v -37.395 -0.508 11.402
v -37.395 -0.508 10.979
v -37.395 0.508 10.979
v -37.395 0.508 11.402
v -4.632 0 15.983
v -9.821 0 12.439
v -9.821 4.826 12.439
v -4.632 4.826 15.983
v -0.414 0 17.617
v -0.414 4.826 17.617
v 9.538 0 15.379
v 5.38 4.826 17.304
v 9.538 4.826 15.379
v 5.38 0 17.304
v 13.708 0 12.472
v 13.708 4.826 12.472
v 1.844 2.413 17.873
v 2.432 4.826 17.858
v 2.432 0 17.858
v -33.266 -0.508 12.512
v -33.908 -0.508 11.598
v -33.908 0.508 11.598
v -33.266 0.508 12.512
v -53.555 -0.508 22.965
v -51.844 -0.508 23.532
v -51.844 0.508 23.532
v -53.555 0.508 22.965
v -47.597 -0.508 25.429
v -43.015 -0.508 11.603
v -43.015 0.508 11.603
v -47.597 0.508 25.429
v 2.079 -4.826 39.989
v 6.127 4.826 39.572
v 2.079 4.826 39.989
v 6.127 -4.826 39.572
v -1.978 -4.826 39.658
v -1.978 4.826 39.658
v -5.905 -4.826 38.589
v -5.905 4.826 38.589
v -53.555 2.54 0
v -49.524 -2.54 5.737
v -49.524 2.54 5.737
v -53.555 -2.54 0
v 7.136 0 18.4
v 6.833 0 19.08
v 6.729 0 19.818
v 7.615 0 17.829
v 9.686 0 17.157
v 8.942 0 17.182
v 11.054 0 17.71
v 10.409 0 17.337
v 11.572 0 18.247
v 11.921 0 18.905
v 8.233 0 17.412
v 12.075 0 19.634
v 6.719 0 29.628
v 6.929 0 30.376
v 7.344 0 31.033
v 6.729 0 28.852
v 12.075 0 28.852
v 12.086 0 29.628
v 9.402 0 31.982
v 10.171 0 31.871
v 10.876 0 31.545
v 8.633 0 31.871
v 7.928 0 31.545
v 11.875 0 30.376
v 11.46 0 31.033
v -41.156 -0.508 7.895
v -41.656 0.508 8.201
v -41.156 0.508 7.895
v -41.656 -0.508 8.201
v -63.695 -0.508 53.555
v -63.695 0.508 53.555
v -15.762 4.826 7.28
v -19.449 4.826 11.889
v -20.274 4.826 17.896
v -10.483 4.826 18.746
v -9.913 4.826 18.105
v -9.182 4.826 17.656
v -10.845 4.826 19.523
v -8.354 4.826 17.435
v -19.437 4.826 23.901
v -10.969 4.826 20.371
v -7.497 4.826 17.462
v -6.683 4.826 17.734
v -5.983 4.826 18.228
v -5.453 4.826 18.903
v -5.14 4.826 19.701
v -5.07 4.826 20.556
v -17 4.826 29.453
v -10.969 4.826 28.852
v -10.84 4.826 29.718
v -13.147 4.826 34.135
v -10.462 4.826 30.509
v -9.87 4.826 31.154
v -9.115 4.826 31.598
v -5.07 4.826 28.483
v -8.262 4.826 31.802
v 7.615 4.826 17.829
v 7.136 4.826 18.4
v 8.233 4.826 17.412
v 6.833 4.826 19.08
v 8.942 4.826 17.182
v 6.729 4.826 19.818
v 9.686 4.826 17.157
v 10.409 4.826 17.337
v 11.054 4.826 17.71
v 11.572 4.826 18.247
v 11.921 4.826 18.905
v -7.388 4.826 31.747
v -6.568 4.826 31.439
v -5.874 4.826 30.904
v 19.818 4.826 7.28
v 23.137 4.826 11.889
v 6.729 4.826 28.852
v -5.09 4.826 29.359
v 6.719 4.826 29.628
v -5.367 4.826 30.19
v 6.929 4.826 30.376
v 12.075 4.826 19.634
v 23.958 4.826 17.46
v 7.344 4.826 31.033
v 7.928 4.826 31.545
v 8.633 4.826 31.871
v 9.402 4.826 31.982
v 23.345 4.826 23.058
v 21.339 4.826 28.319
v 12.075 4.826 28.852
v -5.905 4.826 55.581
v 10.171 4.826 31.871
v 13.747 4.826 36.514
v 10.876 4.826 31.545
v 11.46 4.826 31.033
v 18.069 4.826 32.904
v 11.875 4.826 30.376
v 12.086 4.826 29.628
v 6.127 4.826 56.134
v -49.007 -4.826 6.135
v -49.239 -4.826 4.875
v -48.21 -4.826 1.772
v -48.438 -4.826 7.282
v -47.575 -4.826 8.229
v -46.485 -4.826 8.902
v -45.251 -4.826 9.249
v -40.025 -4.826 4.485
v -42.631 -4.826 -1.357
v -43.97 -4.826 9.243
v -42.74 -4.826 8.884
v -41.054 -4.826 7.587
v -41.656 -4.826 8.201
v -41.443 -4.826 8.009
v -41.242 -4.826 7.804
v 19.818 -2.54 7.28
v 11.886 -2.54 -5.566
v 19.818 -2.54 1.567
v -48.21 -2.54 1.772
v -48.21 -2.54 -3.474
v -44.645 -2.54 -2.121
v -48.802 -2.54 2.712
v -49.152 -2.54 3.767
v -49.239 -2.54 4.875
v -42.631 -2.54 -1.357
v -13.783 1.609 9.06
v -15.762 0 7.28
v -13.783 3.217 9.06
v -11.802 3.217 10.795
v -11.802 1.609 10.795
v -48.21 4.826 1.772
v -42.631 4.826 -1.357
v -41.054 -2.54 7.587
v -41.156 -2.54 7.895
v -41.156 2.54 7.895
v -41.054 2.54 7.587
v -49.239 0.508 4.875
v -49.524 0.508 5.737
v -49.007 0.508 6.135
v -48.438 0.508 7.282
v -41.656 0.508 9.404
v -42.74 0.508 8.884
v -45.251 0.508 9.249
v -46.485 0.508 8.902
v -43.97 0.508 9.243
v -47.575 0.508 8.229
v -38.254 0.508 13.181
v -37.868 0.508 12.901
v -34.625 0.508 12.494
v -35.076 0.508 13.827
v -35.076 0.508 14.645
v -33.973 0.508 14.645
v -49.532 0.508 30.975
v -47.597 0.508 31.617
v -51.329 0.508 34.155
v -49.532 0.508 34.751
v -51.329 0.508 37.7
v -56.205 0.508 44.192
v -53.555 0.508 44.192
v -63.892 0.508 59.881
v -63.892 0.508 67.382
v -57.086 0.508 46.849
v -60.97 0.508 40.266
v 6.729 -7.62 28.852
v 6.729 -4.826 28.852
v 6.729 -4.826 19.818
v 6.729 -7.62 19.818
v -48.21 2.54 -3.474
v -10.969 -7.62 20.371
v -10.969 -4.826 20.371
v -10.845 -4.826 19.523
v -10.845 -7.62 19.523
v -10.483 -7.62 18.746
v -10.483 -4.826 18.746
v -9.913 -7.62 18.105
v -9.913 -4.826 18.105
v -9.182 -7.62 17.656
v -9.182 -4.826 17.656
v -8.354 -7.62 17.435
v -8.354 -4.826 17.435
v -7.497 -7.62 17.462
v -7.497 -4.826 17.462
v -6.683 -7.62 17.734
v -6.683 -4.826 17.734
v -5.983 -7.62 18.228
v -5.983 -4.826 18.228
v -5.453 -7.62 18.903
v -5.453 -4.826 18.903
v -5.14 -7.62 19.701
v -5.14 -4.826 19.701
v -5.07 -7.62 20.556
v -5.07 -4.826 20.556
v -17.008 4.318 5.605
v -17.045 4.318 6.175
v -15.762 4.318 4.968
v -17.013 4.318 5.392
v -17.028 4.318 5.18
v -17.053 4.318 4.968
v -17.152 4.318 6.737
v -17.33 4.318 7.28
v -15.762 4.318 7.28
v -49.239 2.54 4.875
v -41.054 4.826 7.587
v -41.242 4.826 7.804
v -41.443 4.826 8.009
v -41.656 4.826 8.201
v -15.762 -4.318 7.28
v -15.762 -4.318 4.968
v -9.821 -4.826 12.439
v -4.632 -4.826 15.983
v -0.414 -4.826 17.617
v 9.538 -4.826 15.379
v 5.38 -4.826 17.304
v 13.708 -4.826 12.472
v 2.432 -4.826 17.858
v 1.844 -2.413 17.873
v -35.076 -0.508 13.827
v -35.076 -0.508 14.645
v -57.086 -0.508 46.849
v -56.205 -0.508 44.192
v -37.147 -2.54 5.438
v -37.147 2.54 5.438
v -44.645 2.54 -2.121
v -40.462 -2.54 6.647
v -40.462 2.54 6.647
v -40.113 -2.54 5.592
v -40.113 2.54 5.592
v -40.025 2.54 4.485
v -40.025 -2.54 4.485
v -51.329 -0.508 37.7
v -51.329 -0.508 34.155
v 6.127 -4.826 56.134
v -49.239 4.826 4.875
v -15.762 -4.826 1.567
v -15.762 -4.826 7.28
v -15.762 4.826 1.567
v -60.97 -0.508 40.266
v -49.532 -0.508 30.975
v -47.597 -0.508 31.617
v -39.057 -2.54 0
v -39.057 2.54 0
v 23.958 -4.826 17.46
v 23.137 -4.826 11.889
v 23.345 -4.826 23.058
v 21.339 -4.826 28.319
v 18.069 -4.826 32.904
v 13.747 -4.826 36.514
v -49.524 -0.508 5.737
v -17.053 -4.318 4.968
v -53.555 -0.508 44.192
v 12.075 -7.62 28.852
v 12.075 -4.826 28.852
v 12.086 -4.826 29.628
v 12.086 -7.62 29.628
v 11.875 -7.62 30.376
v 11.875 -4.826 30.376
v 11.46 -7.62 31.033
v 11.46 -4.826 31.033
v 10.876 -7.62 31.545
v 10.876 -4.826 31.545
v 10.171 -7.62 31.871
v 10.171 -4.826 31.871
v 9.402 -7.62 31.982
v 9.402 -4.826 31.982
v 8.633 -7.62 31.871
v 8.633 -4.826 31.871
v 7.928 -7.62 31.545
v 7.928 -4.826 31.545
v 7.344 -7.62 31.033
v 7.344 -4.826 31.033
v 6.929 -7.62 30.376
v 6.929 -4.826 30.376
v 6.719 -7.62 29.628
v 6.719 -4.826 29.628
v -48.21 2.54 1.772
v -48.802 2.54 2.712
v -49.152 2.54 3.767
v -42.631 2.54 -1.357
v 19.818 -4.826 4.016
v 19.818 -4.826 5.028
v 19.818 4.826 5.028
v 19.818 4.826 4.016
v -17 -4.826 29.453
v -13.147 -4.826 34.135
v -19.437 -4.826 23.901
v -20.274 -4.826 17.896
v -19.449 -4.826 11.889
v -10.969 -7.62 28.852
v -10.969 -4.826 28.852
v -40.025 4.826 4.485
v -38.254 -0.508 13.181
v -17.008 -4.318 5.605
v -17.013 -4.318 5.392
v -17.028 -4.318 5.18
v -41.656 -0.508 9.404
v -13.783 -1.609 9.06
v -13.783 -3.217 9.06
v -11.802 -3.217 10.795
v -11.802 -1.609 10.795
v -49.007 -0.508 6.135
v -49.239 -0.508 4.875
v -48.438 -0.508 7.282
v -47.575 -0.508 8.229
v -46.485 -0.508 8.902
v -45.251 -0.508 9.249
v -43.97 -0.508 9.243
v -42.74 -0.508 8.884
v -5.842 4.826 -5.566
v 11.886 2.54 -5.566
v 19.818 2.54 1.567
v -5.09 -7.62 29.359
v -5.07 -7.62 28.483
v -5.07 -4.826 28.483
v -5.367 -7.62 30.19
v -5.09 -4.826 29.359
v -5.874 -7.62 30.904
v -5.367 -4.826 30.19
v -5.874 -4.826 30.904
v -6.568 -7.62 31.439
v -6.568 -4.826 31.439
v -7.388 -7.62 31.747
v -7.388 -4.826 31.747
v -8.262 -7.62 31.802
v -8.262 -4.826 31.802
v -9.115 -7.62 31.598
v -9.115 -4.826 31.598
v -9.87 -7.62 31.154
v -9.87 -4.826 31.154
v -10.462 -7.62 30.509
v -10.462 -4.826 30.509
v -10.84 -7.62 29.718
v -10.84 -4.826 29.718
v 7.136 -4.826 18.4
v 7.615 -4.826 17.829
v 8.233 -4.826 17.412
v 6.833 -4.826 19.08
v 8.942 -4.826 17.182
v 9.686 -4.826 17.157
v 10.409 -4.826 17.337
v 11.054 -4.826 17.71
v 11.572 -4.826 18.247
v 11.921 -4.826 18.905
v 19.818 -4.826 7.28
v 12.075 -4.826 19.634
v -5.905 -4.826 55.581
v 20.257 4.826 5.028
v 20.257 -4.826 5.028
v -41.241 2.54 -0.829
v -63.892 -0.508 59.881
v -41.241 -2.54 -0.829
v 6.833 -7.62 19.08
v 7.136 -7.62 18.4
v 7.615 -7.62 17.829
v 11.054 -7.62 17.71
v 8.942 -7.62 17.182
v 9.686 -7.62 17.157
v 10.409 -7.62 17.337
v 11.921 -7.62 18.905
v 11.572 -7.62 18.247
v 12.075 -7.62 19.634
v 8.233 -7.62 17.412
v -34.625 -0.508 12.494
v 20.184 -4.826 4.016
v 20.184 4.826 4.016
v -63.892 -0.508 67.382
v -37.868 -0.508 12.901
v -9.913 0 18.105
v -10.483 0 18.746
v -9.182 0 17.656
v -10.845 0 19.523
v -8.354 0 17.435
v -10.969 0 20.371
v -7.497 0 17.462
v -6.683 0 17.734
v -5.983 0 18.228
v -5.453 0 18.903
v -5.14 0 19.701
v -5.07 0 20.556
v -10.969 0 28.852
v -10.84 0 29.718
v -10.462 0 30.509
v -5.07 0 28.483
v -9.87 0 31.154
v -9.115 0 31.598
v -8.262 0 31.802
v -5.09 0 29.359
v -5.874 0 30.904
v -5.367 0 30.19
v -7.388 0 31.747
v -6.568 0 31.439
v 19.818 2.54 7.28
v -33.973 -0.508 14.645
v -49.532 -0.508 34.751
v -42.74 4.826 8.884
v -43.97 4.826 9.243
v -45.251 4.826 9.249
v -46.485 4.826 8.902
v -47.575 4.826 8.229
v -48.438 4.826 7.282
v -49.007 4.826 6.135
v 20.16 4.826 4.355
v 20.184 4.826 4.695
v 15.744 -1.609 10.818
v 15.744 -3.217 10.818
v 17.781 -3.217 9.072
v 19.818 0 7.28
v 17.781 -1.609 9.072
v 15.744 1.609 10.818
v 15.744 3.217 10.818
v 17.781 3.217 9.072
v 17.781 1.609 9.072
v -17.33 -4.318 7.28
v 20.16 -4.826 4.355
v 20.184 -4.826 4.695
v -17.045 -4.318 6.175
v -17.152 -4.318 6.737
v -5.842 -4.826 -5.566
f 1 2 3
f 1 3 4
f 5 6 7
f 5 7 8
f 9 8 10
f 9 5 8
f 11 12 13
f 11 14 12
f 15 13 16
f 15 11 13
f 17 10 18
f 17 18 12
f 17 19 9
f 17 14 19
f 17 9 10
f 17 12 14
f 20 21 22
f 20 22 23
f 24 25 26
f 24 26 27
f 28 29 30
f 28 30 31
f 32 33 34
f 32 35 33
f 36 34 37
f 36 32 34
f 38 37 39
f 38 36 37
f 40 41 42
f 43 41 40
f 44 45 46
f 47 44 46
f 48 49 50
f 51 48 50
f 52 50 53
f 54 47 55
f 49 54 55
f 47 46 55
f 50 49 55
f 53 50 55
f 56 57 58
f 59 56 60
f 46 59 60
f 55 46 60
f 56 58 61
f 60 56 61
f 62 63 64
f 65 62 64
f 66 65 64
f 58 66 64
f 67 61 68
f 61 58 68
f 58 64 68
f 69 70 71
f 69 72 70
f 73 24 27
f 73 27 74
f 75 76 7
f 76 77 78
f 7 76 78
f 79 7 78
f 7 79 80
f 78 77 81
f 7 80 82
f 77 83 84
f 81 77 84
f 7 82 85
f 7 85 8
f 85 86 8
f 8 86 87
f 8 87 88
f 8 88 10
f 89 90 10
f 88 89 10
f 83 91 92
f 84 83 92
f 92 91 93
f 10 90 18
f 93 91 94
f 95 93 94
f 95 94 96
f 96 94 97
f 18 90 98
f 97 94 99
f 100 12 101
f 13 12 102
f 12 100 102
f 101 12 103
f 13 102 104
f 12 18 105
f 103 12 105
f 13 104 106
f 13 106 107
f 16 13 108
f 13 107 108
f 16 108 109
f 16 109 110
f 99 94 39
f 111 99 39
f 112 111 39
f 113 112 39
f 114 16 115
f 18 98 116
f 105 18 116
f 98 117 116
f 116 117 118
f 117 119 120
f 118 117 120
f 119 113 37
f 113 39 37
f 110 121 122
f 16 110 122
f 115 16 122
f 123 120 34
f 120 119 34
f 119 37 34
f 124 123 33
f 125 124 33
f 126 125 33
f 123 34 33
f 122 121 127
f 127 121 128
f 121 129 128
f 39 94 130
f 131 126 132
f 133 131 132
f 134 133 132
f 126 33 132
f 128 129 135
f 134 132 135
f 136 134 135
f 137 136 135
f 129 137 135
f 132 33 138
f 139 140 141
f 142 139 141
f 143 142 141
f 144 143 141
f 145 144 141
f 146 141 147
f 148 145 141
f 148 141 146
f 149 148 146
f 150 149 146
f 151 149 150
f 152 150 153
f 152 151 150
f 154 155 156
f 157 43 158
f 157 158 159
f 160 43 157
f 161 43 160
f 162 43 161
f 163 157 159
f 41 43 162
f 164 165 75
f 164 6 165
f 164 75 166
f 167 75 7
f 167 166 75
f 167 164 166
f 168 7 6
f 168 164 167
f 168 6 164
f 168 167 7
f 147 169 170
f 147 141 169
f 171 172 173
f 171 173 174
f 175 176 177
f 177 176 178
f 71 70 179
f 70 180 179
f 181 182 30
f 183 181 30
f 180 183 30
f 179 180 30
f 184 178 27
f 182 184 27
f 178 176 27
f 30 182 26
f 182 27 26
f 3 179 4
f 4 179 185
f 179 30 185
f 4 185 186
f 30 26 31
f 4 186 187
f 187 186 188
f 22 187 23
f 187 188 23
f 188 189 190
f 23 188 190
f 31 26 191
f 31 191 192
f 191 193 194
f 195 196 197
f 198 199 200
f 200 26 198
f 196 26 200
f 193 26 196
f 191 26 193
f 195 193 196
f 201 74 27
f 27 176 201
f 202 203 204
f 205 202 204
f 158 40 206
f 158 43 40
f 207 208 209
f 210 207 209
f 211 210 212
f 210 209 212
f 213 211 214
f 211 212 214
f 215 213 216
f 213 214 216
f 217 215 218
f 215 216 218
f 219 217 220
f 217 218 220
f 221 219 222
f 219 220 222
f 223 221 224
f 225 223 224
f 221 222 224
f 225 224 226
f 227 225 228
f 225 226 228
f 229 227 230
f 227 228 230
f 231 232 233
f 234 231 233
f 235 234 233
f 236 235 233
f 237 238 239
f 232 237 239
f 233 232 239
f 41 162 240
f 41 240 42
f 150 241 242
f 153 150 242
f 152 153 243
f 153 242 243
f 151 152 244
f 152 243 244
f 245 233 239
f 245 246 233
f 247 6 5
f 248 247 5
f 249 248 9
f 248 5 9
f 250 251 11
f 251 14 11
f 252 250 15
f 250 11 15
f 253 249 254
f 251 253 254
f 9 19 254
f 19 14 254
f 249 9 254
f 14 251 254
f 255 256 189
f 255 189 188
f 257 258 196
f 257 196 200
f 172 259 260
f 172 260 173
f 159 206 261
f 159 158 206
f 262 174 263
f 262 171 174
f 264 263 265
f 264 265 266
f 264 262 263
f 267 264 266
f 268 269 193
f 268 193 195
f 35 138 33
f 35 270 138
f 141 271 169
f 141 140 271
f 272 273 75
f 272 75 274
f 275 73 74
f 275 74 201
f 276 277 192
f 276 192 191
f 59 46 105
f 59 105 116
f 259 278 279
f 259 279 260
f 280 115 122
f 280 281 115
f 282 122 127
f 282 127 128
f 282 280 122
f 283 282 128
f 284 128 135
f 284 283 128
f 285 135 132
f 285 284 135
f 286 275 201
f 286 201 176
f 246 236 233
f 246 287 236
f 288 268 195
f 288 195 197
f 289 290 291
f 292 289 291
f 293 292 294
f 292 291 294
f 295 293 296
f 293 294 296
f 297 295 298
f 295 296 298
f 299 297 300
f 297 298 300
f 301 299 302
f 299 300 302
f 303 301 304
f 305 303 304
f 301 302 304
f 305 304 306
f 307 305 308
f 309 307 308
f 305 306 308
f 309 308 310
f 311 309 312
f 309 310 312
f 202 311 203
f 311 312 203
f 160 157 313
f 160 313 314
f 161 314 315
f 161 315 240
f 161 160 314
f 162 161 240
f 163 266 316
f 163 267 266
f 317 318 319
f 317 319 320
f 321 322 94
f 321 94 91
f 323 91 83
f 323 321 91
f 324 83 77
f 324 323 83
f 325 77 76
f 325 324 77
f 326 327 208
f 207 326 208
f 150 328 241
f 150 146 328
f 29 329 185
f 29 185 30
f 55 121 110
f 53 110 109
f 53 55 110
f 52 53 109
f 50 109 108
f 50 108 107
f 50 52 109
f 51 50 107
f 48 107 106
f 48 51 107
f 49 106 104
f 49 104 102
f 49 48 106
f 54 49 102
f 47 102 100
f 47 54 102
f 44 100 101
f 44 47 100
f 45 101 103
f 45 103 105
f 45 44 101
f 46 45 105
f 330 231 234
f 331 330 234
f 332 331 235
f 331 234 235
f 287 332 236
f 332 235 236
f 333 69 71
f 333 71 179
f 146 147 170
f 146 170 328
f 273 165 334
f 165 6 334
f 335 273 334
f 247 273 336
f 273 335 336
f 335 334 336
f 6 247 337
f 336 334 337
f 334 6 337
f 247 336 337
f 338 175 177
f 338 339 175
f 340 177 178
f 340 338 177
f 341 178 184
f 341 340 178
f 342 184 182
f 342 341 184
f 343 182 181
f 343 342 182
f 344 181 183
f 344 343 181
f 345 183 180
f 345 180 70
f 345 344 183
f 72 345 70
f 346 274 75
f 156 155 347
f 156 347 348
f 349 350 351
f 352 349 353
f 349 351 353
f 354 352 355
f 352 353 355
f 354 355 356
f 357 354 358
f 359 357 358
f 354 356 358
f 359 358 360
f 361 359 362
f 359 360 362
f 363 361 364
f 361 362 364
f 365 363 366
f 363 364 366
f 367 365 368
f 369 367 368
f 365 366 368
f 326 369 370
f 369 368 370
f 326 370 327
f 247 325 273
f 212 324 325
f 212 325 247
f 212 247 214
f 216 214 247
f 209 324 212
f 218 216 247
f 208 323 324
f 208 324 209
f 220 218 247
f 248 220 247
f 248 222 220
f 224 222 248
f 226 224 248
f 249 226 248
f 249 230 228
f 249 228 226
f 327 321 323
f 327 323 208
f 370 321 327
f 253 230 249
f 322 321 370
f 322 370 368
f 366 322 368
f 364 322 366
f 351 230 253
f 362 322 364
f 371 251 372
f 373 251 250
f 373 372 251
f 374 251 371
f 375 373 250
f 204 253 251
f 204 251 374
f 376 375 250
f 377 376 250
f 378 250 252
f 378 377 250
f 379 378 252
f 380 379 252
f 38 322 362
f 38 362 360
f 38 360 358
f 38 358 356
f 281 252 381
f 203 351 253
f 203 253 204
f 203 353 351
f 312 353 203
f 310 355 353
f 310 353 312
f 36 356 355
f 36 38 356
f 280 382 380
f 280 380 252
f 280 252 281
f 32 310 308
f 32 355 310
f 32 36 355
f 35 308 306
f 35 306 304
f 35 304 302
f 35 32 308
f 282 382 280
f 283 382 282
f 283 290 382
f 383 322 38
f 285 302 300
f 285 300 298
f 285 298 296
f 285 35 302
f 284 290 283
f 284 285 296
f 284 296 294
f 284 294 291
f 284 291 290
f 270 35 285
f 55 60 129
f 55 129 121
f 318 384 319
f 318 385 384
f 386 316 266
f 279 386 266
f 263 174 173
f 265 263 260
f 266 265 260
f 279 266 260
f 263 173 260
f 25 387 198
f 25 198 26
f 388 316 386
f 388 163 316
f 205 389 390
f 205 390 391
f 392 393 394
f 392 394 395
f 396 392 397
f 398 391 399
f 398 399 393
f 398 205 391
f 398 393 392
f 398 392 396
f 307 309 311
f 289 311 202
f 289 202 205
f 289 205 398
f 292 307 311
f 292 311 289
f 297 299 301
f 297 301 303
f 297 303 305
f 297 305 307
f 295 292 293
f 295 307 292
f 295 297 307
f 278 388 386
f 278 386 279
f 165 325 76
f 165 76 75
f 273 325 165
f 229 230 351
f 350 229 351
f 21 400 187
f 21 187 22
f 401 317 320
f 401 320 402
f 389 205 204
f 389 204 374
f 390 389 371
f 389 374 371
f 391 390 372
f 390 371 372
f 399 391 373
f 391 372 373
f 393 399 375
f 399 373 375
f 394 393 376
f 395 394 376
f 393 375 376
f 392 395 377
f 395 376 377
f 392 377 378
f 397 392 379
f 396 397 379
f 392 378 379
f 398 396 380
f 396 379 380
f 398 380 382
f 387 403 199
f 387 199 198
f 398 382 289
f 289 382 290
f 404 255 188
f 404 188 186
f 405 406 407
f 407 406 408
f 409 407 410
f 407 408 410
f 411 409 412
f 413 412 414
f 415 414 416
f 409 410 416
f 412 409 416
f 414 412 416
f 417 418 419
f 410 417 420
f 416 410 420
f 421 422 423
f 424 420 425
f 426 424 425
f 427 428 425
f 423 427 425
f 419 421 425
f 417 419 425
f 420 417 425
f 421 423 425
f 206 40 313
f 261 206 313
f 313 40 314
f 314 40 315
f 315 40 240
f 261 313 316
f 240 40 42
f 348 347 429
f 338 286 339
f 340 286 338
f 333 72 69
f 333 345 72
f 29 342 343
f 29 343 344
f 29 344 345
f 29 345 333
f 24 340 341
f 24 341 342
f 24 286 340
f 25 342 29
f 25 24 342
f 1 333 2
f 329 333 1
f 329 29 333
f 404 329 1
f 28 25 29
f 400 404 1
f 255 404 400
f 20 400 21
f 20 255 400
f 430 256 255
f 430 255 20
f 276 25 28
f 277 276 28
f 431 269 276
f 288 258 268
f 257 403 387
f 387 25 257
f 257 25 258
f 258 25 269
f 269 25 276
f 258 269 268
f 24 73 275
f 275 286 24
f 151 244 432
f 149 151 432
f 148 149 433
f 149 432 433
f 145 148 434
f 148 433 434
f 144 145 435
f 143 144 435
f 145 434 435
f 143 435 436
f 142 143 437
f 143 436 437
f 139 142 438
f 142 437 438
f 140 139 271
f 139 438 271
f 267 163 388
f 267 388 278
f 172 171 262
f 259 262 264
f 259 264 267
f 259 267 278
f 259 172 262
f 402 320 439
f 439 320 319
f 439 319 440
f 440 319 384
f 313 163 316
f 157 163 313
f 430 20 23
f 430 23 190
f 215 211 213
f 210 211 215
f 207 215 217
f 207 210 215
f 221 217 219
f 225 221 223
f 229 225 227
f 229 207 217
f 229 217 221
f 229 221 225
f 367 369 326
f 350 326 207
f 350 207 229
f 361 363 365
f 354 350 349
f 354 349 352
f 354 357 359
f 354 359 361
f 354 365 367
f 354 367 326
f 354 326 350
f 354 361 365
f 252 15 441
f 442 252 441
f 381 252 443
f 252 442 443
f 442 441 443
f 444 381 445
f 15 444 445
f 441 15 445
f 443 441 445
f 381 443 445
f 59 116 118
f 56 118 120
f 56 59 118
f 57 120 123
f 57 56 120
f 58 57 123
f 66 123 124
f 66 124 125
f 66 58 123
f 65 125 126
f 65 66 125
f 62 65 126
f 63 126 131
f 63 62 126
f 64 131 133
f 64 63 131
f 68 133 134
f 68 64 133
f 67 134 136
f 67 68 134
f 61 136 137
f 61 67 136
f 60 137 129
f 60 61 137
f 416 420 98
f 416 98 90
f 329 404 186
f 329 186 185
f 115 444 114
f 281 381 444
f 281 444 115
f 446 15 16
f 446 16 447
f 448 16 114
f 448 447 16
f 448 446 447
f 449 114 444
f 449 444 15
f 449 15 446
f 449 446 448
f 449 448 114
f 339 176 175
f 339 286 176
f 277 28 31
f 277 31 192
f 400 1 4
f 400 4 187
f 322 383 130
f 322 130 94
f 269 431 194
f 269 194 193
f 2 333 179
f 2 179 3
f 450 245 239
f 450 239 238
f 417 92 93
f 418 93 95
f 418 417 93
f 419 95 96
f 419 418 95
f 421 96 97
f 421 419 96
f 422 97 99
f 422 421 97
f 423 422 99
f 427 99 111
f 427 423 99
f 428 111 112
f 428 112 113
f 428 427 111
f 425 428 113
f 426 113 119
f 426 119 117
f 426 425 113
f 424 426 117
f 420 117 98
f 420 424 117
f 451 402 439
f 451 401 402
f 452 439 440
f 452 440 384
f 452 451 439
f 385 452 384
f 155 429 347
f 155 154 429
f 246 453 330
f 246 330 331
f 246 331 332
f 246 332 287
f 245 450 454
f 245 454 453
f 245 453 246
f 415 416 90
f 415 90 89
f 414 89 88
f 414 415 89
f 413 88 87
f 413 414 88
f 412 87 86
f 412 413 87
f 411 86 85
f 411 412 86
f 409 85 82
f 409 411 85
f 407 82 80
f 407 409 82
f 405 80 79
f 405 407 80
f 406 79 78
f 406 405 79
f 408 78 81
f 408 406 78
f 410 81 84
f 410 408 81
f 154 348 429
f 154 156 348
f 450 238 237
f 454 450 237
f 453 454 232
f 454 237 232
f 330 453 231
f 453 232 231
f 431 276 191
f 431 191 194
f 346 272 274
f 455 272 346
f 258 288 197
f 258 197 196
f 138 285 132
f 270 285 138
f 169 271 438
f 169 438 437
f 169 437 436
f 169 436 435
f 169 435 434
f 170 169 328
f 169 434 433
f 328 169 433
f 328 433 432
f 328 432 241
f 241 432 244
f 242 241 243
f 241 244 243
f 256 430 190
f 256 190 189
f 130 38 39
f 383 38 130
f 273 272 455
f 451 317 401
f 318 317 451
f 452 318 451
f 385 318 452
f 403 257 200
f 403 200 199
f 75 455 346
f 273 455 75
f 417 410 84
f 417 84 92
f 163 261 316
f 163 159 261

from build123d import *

# Parameters (mm, degrees)
F1_DEPTH = 4.826
F2_DEPTH = 2.54
F3_DEPTH = 4.318
F4_DEPTH = 0.508
F5_DEPTH = 7.62


# Not quite as in the source:
# - a feature names something its author has since deleted; it is built from what else it names


with BuildPart() as f1:
    # F0 (on Front) → F1 (new body, symmetric)
    with BuildSketch(Plane.XZ):
        with BuildLine():
            Line((-19.4491906807, 11.888597546), (-15.762093921, 7.2797275278))
            add(Edge.make_bspline(
                [(-15.762093921, 7.2797275278), (-13.7826219563, 9.0675403506), (-11.8031481855, 10.8553523876), (-9.8214397399, 12.4394689606)],
                knots=[0, 0, 0, 0, 0.1685559759, 0.1685559759, 0.1685559759, 0.1685559759], degree=3))
            add(Edge.make_bspline(
                [(-9.8214397399, 12.4394689606), (-5.9471315119, 15.5364713912), (1.8450447155, 20.1891726215), (9.7388153599, 15.5763916719), (13.7078197829, 12.4716475158)],
                knots=[0.1685559759, 0.1685559759, 0.1685559759, 0.1685559759, 0.4980887111, 0.8298685344, 0.8298685344, 0.8298685344, 0.8298685344], degree=3))
            add(Edge.make_bspline(
                [(13.7078197829, 12.4716475158), (15.7430627116, 10.8795836338), (17.780595361, 9.0796552071), (19.8181439191, 7.2797275278)],
                knots=[0.8298685344, 0.8298685344, 0.8298685344, 0.8298685344, 1, 1, 1, 1], degree=3))
            Line((19.8181439191, 7.2797275278), (23.1367782905, 11.888597546))
            ThreePointArc((23.1367782905, 11.888597546), (22.5103556775, 25.7526809049), (13.747217288, 36.5143080234))
            ThreePointArc((13.747217288, 36.5143080234), (10.0801885199, 38.3998252427), (6.1269021237, 39.571918174))
            ThreePointArc((6.1269021237, 39.571918174), (0.0427353837, 39.9171387541), (-5.9047092104, 38.5889200339))
            ThreePointArc((-5.9047092104, 38.5889200339), (-9.7419423832, 36.7133942622), (-13.1471515298, 34.135312415))
            ThreePointArc((-13.1471515298, 34.135312415), (-19.4367130362, 23.9010396945), (-19.4491906807, 11.888597546))
        make_face()
        with BuildLine():
            ThreePointArc((-5.0697573461, 20.5555651337), (-7.9242470393, 17.4173960024), (-10.9691116959, 20.37120983))
            Line((-10.9691116959, 20.37120983), (-10.9691116959, 28.851531446))
            ThreePointArc((-10.9691116959, 28.851531446), (-7.8231993673, 31.8069640078), (-5.0697573461, 28.482824564))
            Line((-5.0697573461, 28.482824564), (-5.0697573461, 20.5555651337))
        make_face(mode=Mode.SUBTRACT)
        with BuildLine():
            ThreePointArc((6.7289490253, 28.851531446), (9.4020958059, 31.9821073356), (12.0752425864, 28.851531446))
            Line((12.0752425864, 28.851531446), (12.0752425864, 19.6337904781))
            ThreePointArc((12.0752425864, 19.6337904781), (9.3130419135, 17.1434102004), (6.7289490253, 19.8181457818))
            Line((6.7289490253, 19.8181457818), (6.7289490253, 28.851531446))
        make_face(mode=Mode.SUBTRACT)
        with BuildLine():
            Line((6.1269021237, 56.1337606095), (6.1269021237, 39.571918174))
            ThreePointArc((6.1269021237, 39.571918174), (10.0801885199, 38.3998252427), (13.747217288, 36.5143080234))
            Line((13.747217288, 36.5143080234), (6.1269021237, 56.1337606095))
        make_face()
        with BuildLine():
            Line((-5.9047092104, 55.5806973326), (-13.1471515298, 34.135312415))
            ThreePointArc((-13.1471515298, 34.135312415), (-9.7419423832, 36.7133942622), (-5.9047092104, 38.5889200339))
            Line((-5.9047092104, 38.5889200339), (-5.9047092104, 55.5806973326))
        make_face()
    extrude(amount=F1_DEPTH, both=True)

    # F0 (on Front) → F5 (join)
    with BuildSketch(Plane.XZ):
        with BuildLine():
            Line((-10.9691116959, 28.851531446), (-10.9691116959, 20.37120983))
            ThreePointArc((-10.9691116959, 20.37120983), (-7.9242470393, 17.4173960024), (-5.0697573461, 20.5555651337))
            Line((-5.0697573461, 20.5555651337), (-5.0697573461, 28.482824564))
            ThreePointArc((-5.0697573461, 28.482824564), (-7.8231993673, 31.8069640078), (-10.9691116959, 28.851531446))
        make_face()
        with BuildLine():
            Line((12.0752425864, 19.6337904781), (12.0752425864, 28.851531446))
            ThreePointArc((12.0752425864, 28.851531446), (9.4020958059, 31.9821073356), (6.7289490253, 28.851531446))
            Line((6.7289490253, 28.851531446), (6.7289490253, 19.8181457818))
            ThreePointArc((6.7289490253, 19.8181457818), (9.3130419135, 17.1434102004), (12.0752425864, 19.6337904781))
        make_face()
    extrude(amount=F5_DEPTH)


with BuildPart() as f1b:
    # F0 (on Front) → F1, piece 2 (new body, symmetric)
    with BuildSketch(Plane.XZ):
        with BuildLine():
            Line((20.256677791, 5.0279753847), (19.8181439191, 5.0279753847))
            Line((19.8181439191, 5.0279753847), (19.8181439191, 4.0157617505))
            Line((19.8181439191, 4.0157617505), (20.1839942505, 4.0157617505))
            ThreePointArc((20.1839942505, 4.0157617505), (20.1659410394, 4.525774482), (20.256677791, 5.0279753847))
        make_face()
    extrude(amount=F1_DEPTH, both=True)


with BuildPart() as f1c:
    # F0 (on Front) → F1, piece 3 (new body, symmetric)
    with BuildSketch(Plane.XZ):
        Polygon((-5.842322018, -5.5659487844), (-15.762093921, 7.2797275278), (-15.762093921, 4.9683086441), (-15.762093921, 1.5670161229), align=None)
    extrude(amount=F1_DEPTH, both=True)


with BuildPart() as f1d:
    # F0 (on Front) → F1, piece 4 (new body, symmetric)
    with BuildSketch(Plane.XZ):
        with BuildLine():
            Line((-48.2102003072, 1.7716179376), (-42.6312641226, -1.3567452536))
            Line((-42.6312641226, -1.3567452536), (-40.025416848, 4.4845512796))
            Line((-40.025416848, 4.4845512796), (-41.0539040545, 7.5874454587))
            ThreePointArc((-41.0539040545, 7.5874454587), (-41.3406632708, 7.908442582), (-41.6561064599, 8.2013002196))
            ThreePointArc((-41.6561064599, 8.2013002196), (-46.4845280708, 8.9017869639), (-49.2386875136, 4.8745121166))
            Line((-49.2386875136, 4.8745121166), (-48.2102003072, 1.7716179376))
        make_face()
    extrude(amount=F1_DEPTH, both=True)


with BuildPart() as f2:
    # F0 (on Front) → F2 (new body, symmetric)
    with BuildSketch(Plane.XZ):
        Polygon((19.8181439191, 7.2797275278), (11.8864420801, -5.5659487844), (19.8181439191, 1.5670161229), (19.8181439191, 4.0157617505), (19.8181439191, 5.0279753847), align=None)
    extrude(amount=F2_DEPTH, both=True)


with BuildPart() as f2b:
    # F0 (on Front) → F2, piece 2 (new body, symmetric)
    with BuildSketch(Plane.XZ):
        with BuildLine():
            Line((-44.6452607465, -2.1211398475), (-42.6312641226, -1.3567452536))
            Line((-42.6312641226, -1.3567452536), (-48.2102003072, 1.7716179376))
            ThreePointArc((-48.2102003072, 1.7716179376), (-49.0086556744, 3.2288600216), (-49.2386875136, 4.8745121166))
            Line((-49.2386875136, 4.8745121166), (-49.5244317276, 5.7365880401))
            Line((-49.5244317276, 5.7365880401), (-53.5550825298, 0))
            Line((-53.5550825298, 0), (-48.2102003072, -3.4741811065))
            Line((-48.2102003072, -3.4741811065), (-44.6452607465, -2.1211398475))
        make_face()
    extrude(amount=F2_DEPTH, both=True)


with BuildPart() as f2c:
    # F0 (on Front) → F2, piece 3 (new body, symmetric)
    with BuildSketch(Plane.XZ):
        with BuildLine():
            Line((-42.6312641226, -1.3567452536), (-41.2408662619, -0.8290320512))
            Line((-41.2408662619, -0.8290320512), (-39.0565654234, 0))
            Line((-39.0565654234, 0), (-37.1474996209, 5.4384674877))
            Line((-37.1474996209, 5.4384674877), (-41.1557403652, 7.8946804868))
            Line((-41.1557403652, 7.8946804868), (-41.0539040545, 7.5874454587))
            ThreePointArc((-41.0539040545, 7.5874454587), (-40.2554486873, 6.1302033746), (-40.025416848, 4.4845512796))
            Line((-40.025416848, 4.4845512796), (-42.6312641226, -1.3567452536))
        make_face()
    extrude(amount=F2_DEPTH, both=True)


with BuildPart() as f3:
    # F0 (on Front) → F3 (new body, symmetric)
    with BuildSketch(Plane.XZ):
        with BuildLine():
            Line((-15.762093921, 4.9683086441), (-15.762093921, 7.2797275278))
            Line((-15.762093921, 7.2797275278), (-17.3304833915, 7.2797275278))
            ThreePointArc((-17.3304833915, 7.2797275278), (-17.0896080002, 6.4576904492), (-17.0083409329, 5.6049527542))
            ThreePointArc((-17.0083409329, 5.6049527542), (-17.0196339379, 5.2858324269), (-17.0534564546, 4.9683086441))
            Line((-17.0534564546, 4.9683086441), (-15.762093921, 4.9683086441))
        make_face()
    extrude(amount=F3_DEPTH, both=True)


with BuildPart() as f4:
    # F0 (on Front) → F4 (new body, symmetric)
    with BuildSketch(Plane.XZ):
        with BuildLine():
            Line((-41.6561064599, 8.2013002196), (-41.1557403652, 7.8946804868))
            Line((-41.1557403652, 7.8946804868), (-41.6561064599, 9.4042598309))
            Line((-41.6561064599, 9.4042598309), (-37.39515692, 10.978648439))
            Line((-37.39515692, 10.978648439), (-37.39515692, 11.4023303613))
            Line((-37.39515692, 11.4023303613), (-34.6250385046, 12.4941263348))
            Line((-34.6250385046, 12.4941263348), (-33.9080691338, 11.5978755057))
            Line((-33.9080691338, 11.5978755057), (-33.2663303501, 12.5123980251))
            Line((-33.2663303501, 12.5123980251), (-33.9732468128, 14.6451294422))
            Line((-33.9732468128, 14.6451294422), (-35.0756955059, 14.6451294422))
            Line((-35.0756955059, 14.6451294422), (-35.0756955059, 13.8269480115))
            Line((-35.0756955059, 13.8269480115), (-37.8684664491, 12.9012544429))
            Line((-37.8684664491, 12.9012544429), (-38.2543841723, 13.1811112886))
            Line((-38.2543841723, 13.1811112886), (-43.0145218035, 11.6033131517))
            Line((-43.0145218035, 11.6033131517), (-47.5972788614, 25.4292607277))
            Line((-47.5972788614, 25.4292607277), (-47.5972788614, 31.6165960183))
            Line((-47.5972788614, 31.6165960183), (-49.5319052912, 30.9753435561))
            Line((-49.5319052912, 30.9753435561), (-49.5319052912, 34.7506268671))
            Line((-49.5319052912, 34.7506268671), (-51.329412806, 34.1548239244))
            Line((-51.329412806, 34.1548239244), (-51.329412806, 37.700308))
            Line((-51.329412806, 37.700308), (-53.5550825298, 44.1921142478))
            Line((-53.5550825298, 44.1921142478), (-56.2054766065, 44.1921142478))
            Line((-56.2054766065, 44.1921142478), (-57.0860852852, 46.8488663453))
            Line((-57.0860852852, 46.8488663453), (-63.8919092274, 67.3816949129))
            Line((-63.8919092274, 67.3816949129), (-63.8919092274, 59.8809927873))
            Line((-63.8919092274, 59.8809927873), (-51.8436354556, 23.5319567276))
            Line((-51.8436354556, 23.5319567276), (-53.5550825298, 22.9646794314))
            Line((-53.5550825298, 22.9646794314), (-63.6945962906, 53.5550825298))
            Line((-63.6945962906, 53.5550825298), (-60.9696031492, 40.2660946392))
            Line((-60.9696031492, 40.2660946392), (-49.5244317276, 5.7365880401))
            Line((-49.5244317276, 5.7365880401), (-49.2386875136, 4.8745121166))
            ThreePointArc((-49.2386875136, 4.8745121166), (-46.4845280708, 8.9017869639), (-41.6561064599, 8.2013002196))
        make_face()
    extrude(amount=F4_DEPTH, both=True)


solid = Compound([f1.part, f1b.part, f1c.part, f1d.part, f2.part, f2b.part, f2c.part, f3.part, f4.part])
